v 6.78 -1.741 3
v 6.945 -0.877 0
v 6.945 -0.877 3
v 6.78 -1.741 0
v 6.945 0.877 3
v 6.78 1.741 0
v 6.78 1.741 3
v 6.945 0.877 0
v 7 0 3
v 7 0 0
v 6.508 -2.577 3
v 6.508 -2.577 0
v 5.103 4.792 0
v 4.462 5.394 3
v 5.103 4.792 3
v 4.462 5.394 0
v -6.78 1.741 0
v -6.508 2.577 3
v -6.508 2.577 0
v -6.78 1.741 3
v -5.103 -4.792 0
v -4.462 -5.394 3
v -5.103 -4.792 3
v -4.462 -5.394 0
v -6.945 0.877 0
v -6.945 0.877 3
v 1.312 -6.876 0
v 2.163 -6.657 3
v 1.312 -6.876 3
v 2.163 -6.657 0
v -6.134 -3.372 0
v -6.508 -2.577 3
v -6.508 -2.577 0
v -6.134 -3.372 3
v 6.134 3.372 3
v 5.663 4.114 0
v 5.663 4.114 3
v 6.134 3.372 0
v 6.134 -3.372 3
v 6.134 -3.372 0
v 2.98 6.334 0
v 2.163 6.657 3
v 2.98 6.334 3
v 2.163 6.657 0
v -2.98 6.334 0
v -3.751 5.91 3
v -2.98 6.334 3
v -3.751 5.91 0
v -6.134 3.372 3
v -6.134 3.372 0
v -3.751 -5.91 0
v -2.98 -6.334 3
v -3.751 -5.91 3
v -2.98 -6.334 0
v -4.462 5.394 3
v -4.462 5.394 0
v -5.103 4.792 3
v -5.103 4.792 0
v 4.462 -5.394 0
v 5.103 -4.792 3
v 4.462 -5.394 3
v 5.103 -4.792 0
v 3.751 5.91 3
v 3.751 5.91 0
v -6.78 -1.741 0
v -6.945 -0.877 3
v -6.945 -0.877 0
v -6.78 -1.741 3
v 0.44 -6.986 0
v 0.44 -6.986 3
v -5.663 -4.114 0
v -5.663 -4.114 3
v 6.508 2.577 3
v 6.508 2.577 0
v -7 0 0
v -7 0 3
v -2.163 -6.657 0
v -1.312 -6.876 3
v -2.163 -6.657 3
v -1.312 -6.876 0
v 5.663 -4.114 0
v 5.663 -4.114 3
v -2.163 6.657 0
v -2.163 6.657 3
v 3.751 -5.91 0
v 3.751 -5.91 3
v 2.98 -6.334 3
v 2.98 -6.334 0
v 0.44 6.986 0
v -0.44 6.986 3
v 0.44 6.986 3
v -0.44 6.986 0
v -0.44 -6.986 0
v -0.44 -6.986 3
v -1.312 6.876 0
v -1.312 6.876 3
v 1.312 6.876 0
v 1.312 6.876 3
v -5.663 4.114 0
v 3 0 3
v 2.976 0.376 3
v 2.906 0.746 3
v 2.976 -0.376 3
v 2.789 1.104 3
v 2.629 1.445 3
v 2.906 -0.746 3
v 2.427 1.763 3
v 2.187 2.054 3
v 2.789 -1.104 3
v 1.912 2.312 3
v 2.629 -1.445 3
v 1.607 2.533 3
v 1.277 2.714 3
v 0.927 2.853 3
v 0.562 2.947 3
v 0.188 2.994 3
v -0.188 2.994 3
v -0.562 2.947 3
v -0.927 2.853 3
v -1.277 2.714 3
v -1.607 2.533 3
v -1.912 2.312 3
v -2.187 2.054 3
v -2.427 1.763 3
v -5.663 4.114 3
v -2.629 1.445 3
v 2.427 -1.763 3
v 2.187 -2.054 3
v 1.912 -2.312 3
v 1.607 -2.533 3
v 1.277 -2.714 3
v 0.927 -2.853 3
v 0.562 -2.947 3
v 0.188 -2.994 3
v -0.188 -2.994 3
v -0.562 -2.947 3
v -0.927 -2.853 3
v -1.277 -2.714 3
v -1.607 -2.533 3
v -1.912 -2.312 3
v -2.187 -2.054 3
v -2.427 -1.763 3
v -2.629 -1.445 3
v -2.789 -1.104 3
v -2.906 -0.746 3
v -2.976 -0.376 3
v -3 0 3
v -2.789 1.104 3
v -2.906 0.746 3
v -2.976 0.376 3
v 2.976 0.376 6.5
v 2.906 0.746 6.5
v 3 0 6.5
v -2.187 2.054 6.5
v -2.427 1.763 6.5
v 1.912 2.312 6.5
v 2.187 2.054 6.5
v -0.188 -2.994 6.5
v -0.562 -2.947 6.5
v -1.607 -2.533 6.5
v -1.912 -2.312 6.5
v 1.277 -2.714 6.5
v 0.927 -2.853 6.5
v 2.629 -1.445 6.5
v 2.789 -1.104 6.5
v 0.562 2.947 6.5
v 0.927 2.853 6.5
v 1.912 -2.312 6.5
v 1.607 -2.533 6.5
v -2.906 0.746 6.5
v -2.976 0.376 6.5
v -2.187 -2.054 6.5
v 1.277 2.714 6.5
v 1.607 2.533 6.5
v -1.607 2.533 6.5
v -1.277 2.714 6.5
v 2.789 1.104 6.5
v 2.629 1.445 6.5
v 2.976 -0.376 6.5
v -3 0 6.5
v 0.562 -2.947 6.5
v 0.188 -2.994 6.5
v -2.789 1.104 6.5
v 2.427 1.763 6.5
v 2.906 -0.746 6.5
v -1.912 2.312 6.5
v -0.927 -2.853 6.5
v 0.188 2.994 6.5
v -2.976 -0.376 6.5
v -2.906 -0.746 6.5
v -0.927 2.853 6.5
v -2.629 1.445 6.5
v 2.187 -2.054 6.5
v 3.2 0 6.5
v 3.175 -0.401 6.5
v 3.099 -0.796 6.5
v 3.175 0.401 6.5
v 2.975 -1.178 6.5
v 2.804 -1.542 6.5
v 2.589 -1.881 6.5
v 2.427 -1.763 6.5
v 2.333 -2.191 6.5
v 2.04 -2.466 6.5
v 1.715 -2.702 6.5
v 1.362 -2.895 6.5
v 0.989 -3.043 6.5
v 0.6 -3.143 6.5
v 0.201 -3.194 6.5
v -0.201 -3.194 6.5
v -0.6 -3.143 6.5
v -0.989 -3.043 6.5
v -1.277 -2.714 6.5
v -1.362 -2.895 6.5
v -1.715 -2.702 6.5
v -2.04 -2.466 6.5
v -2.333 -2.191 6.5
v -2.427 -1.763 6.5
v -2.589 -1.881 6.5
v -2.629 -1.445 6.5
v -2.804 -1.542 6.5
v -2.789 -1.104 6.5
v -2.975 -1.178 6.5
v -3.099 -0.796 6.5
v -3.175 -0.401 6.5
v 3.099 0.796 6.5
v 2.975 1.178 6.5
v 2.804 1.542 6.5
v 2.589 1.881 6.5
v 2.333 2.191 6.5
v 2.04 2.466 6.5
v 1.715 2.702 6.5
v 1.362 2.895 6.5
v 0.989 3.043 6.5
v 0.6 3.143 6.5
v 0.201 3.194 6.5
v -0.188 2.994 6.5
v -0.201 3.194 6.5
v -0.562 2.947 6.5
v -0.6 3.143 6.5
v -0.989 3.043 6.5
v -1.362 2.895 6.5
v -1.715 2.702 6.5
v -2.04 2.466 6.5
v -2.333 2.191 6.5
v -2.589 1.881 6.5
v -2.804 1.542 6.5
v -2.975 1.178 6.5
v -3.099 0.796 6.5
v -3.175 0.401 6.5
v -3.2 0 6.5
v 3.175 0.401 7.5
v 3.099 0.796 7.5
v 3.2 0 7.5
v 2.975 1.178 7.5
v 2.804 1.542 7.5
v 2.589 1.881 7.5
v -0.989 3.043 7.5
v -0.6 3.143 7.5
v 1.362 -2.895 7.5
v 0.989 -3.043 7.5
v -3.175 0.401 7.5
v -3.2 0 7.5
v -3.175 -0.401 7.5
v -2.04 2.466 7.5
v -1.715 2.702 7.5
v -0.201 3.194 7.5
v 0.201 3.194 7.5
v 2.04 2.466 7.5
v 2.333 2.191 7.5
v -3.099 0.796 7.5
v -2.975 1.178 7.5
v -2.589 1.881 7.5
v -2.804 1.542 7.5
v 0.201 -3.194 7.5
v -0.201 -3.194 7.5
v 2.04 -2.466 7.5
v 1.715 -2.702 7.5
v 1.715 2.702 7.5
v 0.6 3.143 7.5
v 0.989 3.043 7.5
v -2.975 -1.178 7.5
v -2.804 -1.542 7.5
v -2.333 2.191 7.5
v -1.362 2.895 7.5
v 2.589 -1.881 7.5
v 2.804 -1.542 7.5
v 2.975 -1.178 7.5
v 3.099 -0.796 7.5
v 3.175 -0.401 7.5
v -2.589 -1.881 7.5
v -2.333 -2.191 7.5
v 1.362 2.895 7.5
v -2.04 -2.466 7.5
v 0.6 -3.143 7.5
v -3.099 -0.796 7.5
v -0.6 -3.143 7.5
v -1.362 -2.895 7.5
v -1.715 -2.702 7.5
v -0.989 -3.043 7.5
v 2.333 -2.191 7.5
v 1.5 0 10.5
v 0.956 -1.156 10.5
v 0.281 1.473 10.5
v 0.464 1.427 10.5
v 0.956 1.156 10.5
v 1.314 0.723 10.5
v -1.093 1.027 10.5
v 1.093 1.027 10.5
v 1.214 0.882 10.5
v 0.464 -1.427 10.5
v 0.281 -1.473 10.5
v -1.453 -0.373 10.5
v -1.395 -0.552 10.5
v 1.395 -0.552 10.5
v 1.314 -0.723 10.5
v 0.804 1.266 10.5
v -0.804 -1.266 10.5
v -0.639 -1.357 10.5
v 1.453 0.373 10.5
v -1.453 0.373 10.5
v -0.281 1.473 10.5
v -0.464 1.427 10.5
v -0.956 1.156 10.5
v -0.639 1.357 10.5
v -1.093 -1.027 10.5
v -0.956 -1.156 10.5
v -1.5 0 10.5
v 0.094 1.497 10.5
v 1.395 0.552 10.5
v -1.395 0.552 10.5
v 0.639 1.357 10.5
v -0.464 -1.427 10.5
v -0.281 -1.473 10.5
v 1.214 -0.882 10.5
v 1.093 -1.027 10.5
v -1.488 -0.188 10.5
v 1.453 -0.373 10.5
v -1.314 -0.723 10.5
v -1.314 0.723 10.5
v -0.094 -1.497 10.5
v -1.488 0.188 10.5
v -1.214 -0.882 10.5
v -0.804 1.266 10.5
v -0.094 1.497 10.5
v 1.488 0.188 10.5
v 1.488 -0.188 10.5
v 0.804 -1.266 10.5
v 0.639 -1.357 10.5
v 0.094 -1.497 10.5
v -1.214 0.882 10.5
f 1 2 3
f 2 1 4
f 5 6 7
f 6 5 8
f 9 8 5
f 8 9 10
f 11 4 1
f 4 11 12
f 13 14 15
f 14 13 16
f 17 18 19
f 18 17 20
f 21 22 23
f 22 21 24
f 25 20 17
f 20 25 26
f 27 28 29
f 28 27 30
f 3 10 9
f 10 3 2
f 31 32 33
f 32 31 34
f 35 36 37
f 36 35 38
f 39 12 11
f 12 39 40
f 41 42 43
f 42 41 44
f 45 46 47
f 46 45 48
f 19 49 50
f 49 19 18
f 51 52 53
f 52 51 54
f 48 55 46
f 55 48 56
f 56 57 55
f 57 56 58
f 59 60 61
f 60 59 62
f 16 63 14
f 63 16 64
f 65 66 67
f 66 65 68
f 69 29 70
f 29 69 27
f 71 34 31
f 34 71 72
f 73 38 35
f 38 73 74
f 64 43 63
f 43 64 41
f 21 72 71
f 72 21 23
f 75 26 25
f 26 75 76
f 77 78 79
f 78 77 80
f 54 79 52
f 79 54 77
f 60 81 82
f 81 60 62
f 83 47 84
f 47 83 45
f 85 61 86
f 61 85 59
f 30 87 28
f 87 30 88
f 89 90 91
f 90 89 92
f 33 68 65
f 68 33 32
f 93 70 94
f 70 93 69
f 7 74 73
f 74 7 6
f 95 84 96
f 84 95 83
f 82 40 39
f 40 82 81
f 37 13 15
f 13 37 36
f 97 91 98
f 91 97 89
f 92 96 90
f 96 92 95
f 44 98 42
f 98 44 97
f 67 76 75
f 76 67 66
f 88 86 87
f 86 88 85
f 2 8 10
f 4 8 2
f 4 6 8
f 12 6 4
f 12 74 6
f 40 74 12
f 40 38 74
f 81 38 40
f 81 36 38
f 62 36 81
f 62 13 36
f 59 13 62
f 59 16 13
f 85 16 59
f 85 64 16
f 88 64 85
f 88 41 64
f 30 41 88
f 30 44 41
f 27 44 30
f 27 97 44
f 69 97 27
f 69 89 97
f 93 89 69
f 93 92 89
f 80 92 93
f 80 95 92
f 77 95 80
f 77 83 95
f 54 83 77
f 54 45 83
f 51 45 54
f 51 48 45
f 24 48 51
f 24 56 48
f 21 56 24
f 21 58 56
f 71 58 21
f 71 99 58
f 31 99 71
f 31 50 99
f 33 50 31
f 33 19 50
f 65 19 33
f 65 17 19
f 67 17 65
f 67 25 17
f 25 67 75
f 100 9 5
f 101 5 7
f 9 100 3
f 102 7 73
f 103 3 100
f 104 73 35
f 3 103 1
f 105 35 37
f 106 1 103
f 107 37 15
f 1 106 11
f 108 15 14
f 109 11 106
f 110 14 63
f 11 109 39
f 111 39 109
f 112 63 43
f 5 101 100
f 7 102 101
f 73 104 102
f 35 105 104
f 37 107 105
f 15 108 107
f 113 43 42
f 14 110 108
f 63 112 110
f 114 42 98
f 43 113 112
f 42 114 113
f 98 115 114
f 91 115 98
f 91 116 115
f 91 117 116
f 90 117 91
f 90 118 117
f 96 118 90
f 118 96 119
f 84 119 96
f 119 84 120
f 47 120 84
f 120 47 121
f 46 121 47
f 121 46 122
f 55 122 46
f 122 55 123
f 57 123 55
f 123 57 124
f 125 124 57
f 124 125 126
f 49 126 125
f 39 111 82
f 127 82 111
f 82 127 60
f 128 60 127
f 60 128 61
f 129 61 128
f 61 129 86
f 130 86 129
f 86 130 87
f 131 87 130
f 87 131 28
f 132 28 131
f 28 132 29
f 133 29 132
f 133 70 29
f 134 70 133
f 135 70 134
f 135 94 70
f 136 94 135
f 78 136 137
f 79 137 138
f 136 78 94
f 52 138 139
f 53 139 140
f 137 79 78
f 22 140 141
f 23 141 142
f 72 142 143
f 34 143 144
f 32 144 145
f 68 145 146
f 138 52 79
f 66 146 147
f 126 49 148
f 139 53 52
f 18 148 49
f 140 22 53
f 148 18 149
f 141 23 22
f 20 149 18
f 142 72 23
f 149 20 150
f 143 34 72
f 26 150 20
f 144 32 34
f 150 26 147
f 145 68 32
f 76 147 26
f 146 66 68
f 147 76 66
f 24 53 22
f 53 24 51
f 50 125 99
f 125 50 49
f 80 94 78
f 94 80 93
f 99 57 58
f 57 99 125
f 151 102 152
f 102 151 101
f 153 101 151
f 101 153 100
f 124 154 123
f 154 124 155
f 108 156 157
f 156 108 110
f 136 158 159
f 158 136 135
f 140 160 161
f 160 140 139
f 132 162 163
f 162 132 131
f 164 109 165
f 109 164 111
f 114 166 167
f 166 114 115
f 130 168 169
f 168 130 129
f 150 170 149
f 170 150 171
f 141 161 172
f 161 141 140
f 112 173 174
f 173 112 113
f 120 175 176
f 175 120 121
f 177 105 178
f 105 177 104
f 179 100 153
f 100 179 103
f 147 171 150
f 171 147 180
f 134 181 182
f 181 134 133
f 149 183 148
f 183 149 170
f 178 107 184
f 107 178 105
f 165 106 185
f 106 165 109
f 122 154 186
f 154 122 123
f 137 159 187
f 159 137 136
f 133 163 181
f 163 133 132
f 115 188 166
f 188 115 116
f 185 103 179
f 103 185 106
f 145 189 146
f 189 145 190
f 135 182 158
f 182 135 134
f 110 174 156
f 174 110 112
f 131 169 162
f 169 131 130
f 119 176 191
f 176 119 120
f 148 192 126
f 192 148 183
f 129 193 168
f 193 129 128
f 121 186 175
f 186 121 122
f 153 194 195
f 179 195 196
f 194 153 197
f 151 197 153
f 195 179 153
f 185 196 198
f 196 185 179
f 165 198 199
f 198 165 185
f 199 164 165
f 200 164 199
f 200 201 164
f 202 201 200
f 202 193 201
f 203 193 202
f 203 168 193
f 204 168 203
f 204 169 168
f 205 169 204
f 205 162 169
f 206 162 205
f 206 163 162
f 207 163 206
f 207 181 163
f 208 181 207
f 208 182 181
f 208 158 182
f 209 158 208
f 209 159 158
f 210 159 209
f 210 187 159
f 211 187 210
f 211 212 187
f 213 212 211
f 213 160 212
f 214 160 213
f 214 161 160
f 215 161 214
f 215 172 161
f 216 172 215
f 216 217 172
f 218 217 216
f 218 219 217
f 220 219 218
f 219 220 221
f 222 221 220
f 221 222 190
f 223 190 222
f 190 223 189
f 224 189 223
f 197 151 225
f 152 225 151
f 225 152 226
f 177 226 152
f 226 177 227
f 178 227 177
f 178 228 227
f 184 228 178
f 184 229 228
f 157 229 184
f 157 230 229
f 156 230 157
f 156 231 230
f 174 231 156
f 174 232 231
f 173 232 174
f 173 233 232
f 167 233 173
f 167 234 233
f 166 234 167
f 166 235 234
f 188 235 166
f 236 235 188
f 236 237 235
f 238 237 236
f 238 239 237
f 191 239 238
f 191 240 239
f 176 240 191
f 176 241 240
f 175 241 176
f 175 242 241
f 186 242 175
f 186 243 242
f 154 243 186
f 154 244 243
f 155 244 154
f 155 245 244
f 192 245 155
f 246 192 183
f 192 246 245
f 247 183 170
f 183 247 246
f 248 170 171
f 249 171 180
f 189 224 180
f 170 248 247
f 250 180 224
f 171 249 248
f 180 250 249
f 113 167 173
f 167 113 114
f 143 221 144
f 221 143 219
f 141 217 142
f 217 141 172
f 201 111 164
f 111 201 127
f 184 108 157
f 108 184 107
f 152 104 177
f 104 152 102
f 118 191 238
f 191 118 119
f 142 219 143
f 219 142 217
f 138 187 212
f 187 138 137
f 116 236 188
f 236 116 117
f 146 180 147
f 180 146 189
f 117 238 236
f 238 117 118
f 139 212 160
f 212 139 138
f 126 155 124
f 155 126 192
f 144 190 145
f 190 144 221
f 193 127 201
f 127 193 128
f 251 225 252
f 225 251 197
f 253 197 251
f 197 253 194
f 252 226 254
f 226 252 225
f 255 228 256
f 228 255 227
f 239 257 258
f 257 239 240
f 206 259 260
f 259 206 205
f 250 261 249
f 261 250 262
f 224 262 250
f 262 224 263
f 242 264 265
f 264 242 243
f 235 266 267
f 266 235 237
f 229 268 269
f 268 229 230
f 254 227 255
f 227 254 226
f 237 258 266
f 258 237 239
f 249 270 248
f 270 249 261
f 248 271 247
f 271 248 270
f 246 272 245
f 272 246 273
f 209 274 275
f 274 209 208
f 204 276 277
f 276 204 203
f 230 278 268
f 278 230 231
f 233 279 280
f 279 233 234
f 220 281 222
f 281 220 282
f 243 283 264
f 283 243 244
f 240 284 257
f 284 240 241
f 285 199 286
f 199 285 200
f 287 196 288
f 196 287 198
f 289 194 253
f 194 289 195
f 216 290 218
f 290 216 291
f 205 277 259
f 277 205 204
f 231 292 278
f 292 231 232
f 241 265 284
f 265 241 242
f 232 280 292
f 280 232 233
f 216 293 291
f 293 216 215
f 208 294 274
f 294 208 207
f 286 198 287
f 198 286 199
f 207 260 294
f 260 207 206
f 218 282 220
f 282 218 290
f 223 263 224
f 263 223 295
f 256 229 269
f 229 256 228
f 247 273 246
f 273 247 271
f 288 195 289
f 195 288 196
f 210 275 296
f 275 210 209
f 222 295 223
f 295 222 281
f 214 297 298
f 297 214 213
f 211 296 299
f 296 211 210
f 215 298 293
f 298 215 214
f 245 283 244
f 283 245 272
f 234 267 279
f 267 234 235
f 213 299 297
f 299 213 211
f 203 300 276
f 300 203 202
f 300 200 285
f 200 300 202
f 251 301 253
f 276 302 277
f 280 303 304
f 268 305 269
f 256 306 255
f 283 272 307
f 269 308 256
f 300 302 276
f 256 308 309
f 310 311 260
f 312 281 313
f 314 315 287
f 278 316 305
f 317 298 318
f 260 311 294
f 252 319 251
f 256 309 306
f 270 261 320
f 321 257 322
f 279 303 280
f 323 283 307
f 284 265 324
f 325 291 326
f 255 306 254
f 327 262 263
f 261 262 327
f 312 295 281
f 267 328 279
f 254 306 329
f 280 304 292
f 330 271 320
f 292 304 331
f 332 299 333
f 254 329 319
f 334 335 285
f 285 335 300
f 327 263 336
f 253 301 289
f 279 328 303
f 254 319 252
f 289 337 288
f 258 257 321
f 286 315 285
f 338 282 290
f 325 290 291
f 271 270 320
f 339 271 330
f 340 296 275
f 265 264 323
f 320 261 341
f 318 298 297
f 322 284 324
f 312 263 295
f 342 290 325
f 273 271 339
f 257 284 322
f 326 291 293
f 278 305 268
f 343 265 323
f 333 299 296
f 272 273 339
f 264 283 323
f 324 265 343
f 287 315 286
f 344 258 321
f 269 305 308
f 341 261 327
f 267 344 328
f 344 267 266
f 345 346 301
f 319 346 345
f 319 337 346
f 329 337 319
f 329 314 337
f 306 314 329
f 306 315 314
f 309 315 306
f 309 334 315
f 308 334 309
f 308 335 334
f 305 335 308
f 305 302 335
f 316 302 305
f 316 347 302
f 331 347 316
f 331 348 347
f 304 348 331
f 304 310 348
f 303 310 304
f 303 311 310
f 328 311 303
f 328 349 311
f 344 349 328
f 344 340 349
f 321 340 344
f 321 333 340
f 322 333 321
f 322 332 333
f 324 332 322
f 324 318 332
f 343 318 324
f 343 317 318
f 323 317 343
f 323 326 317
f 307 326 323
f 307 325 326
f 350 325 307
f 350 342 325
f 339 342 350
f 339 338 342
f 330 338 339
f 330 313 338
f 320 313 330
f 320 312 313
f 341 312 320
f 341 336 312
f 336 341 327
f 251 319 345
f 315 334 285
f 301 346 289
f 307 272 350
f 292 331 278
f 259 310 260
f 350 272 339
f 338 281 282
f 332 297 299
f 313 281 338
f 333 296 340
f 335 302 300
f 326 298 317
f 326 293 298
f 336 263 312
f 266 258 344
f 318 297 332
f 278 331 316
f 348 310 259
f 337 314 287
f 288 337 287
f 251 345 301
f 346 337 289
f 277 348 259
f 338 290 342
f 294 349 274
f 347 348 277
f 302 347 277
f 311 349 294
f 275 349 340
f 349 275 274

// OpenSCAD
// Honda Pedal Stop

// Increase resolution
$fn=50;

// Variables
face_d = 7;
face_h = 3;
shaft_d = 3;
shaft_h = 3.5;
bump_d = 3.2;
bump_h = 1;
cone_h = 3;
cone_end_d = 1.5;

// Face
cylinder(h=face_h,r=face_d);

// Shaft
translate([0,0,face_h]) cylinder(h=shaft_h,r=shaft_d);

// Bump
translate([0,0,face_h+shaft_h]) cylinder(h=bump_h,r=bump_d);

// Cone
translate([0,0,(face_h+shaft_h+bump_h)]) cylinder(h=cone_h,r1=bump_d,r2=cone_end_d);
